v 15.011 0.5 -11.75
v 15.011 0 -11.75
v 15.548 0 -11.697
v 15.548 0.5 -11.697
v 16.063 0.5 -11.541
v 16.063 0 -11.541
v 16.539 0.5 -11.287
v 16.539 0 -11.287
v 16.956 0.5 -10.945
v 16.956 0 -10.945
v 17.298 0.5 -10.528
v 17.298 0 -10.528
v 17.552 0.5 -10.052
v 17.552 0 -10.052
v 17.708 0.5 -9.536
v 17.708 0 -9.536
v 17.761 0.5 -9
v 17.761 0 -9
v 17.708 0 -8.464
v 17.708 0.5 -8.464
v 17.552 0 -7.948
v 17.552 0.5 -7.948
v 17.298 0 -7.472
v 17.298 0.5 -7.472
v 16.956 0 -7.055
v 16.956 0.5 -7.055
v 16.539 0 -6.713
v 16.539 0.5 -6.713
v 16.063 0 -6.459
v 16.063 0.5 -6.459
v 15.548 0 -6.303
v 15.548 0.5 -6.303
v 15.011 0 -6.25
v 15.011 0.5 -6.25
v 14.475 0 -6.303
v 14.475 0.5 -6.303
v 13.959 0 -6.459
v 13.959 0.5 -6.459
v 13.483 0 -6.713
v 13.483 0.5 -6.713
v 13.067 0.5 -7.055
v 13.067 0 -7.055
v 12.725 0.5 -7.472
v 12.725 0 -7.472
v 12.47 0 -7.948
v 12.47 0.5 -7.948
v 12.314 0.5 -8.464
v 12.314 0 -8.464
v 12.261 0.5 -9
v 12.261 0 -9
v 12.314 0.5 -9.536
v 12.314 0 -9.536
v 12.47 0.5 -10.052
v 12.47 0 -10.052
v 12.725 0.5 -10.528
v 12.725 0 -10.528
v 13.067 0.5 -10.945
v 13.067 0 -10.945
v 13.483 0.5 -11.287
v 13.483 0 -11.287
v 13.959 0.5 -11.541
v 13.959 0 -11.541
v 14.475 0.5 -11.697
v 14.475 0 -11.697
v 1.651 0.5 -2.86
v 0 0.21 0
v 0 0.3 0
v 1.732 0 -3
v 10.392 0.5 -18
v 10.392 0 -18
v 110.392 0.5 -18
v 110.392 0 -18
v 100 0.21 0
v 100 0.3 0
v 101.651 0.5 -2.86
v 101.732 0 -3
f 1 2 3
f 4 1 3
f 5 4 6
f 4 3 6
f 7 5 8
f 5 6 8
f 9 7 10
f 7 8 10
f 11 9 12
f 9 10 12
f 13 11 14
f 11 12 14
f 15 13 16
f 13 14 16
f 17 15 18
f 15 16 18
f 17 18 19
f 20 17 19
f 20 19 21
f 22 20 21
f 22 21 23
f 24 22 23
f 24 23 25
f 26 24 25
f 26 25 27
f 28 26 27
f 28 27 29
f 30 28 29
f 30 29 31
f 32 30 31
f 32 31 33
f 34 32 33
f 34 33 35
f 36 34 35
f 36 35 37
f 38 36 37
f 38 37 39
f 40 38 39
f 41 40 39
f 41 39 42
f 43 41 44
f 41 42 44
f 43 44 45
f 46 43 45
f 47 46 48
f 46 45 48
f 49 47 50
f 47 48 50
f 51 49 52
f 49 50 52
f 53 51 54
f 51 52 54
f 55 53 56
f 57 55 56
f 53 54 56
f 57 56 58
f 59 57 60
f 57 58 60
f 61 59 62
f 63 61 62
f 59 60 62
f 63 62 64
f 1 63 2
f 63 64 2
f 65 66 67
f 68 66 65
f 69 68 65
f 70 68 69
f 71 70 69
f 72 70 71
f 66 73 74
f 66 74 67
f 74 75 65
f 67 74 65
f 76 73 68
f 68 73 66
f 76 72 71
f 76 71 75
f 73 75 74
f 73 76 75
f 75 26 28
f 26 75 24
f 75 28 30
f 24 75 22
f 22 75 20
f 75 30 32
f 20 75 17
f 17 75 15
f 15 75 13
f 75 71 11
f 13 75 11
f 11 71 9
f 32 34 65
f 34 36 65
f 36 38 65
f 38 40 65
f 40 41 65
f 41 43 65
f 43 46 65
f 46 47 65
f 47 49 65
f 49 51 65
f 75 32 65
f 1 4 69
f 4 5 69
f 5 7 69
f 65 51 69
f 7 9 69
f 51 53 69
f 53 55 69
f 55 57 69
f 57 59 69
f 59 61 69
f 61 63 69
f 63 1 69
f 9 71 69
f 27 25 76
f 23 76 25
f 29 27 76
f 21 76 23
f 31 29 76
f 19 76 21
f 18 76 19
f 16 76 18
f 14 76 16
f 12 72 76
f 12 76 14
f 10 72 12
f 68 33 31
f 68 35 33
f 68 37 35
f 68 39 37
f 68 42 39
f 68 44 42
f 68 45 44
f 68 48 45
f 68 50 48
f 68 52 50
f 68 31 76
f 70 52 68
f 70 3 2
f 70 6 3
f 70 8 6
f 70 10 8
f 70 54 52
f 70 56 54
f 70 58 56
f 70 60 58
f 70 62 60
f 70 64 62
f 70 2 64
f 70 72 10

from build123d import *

# Parameters (mm, degrees)
EXTRUDE_1_DEPTH     = 0.5
SKETCH_2_R          = 2.75
CUT_EXTRUDE_1_DEPTH = 10
CHAMFER_1_SIZE      = 3
CHAMFER_1_SIZE2     = 0.209780436
CHAMFER_2_SIZE      = 0.2
CHAMFER_2_SIZE2     = 2.860133251


with BuildPart() as part:
    # 草图1 → 凸台-拉伸1 (new body)
    with BuildSketch(Plane(origin=(0, 0, 0), x_dir=(1, 0, 0), z_dir=(0, 1, 0))):
        Polygon((0, 0), (10.392304845, 18), (110.392304845, 18), (100, 0), align=None)
    extrude(amount=EXTRUDE_1_DEPTH)

    # 草图2 → 切除-拉伸1 (cut)
    with BuildSketch(Plane(origin=(0, 0, 0), x_dir=(-1, 0, 0), z_dir=(0, -1, 0))):
        with Locations(Location((-15.011106999, 9, 0), (0, 0, 90))):
            Circle(SKETCH_2_R)
    extrude(amount=-CUT_EXTRUDE_1_DEPTH, mode=Mode.SUBTRACT)

    # 倒角1
    chamfer_1_edges = [part.edges().sort_by_distance(p)[0] for p in [
        (50, 0, 0),
    ]]
    chamfer_1_side = [part.faces().sort_by_distance(p)[0] for p in [
        (55.733651423, 0, -9),
    ]]
    chamfer(chamfer_1_edges, length=CHAMFER_1_SIZE, length2=CHAMFER_1_SIZE2, reference=chamfer_1_side[0])

    # 倒角2
    chamfer_2_edges = [part.edges().sort_by_distance(p)[0] for p in [
        (50, 0.5, 0),
    ]]
    chamfer_2_side = [part.faces().sort_by_distance(p)[0] for p in [
        (50, 0.354890218, 0),
    ]]
    chamfer(chamfer_2_edges, length=CHAMFER_2_SIZE, length2=CHAMFER_2_SIZE2, reference=chamfer_2_side[0])


solid = part.part
